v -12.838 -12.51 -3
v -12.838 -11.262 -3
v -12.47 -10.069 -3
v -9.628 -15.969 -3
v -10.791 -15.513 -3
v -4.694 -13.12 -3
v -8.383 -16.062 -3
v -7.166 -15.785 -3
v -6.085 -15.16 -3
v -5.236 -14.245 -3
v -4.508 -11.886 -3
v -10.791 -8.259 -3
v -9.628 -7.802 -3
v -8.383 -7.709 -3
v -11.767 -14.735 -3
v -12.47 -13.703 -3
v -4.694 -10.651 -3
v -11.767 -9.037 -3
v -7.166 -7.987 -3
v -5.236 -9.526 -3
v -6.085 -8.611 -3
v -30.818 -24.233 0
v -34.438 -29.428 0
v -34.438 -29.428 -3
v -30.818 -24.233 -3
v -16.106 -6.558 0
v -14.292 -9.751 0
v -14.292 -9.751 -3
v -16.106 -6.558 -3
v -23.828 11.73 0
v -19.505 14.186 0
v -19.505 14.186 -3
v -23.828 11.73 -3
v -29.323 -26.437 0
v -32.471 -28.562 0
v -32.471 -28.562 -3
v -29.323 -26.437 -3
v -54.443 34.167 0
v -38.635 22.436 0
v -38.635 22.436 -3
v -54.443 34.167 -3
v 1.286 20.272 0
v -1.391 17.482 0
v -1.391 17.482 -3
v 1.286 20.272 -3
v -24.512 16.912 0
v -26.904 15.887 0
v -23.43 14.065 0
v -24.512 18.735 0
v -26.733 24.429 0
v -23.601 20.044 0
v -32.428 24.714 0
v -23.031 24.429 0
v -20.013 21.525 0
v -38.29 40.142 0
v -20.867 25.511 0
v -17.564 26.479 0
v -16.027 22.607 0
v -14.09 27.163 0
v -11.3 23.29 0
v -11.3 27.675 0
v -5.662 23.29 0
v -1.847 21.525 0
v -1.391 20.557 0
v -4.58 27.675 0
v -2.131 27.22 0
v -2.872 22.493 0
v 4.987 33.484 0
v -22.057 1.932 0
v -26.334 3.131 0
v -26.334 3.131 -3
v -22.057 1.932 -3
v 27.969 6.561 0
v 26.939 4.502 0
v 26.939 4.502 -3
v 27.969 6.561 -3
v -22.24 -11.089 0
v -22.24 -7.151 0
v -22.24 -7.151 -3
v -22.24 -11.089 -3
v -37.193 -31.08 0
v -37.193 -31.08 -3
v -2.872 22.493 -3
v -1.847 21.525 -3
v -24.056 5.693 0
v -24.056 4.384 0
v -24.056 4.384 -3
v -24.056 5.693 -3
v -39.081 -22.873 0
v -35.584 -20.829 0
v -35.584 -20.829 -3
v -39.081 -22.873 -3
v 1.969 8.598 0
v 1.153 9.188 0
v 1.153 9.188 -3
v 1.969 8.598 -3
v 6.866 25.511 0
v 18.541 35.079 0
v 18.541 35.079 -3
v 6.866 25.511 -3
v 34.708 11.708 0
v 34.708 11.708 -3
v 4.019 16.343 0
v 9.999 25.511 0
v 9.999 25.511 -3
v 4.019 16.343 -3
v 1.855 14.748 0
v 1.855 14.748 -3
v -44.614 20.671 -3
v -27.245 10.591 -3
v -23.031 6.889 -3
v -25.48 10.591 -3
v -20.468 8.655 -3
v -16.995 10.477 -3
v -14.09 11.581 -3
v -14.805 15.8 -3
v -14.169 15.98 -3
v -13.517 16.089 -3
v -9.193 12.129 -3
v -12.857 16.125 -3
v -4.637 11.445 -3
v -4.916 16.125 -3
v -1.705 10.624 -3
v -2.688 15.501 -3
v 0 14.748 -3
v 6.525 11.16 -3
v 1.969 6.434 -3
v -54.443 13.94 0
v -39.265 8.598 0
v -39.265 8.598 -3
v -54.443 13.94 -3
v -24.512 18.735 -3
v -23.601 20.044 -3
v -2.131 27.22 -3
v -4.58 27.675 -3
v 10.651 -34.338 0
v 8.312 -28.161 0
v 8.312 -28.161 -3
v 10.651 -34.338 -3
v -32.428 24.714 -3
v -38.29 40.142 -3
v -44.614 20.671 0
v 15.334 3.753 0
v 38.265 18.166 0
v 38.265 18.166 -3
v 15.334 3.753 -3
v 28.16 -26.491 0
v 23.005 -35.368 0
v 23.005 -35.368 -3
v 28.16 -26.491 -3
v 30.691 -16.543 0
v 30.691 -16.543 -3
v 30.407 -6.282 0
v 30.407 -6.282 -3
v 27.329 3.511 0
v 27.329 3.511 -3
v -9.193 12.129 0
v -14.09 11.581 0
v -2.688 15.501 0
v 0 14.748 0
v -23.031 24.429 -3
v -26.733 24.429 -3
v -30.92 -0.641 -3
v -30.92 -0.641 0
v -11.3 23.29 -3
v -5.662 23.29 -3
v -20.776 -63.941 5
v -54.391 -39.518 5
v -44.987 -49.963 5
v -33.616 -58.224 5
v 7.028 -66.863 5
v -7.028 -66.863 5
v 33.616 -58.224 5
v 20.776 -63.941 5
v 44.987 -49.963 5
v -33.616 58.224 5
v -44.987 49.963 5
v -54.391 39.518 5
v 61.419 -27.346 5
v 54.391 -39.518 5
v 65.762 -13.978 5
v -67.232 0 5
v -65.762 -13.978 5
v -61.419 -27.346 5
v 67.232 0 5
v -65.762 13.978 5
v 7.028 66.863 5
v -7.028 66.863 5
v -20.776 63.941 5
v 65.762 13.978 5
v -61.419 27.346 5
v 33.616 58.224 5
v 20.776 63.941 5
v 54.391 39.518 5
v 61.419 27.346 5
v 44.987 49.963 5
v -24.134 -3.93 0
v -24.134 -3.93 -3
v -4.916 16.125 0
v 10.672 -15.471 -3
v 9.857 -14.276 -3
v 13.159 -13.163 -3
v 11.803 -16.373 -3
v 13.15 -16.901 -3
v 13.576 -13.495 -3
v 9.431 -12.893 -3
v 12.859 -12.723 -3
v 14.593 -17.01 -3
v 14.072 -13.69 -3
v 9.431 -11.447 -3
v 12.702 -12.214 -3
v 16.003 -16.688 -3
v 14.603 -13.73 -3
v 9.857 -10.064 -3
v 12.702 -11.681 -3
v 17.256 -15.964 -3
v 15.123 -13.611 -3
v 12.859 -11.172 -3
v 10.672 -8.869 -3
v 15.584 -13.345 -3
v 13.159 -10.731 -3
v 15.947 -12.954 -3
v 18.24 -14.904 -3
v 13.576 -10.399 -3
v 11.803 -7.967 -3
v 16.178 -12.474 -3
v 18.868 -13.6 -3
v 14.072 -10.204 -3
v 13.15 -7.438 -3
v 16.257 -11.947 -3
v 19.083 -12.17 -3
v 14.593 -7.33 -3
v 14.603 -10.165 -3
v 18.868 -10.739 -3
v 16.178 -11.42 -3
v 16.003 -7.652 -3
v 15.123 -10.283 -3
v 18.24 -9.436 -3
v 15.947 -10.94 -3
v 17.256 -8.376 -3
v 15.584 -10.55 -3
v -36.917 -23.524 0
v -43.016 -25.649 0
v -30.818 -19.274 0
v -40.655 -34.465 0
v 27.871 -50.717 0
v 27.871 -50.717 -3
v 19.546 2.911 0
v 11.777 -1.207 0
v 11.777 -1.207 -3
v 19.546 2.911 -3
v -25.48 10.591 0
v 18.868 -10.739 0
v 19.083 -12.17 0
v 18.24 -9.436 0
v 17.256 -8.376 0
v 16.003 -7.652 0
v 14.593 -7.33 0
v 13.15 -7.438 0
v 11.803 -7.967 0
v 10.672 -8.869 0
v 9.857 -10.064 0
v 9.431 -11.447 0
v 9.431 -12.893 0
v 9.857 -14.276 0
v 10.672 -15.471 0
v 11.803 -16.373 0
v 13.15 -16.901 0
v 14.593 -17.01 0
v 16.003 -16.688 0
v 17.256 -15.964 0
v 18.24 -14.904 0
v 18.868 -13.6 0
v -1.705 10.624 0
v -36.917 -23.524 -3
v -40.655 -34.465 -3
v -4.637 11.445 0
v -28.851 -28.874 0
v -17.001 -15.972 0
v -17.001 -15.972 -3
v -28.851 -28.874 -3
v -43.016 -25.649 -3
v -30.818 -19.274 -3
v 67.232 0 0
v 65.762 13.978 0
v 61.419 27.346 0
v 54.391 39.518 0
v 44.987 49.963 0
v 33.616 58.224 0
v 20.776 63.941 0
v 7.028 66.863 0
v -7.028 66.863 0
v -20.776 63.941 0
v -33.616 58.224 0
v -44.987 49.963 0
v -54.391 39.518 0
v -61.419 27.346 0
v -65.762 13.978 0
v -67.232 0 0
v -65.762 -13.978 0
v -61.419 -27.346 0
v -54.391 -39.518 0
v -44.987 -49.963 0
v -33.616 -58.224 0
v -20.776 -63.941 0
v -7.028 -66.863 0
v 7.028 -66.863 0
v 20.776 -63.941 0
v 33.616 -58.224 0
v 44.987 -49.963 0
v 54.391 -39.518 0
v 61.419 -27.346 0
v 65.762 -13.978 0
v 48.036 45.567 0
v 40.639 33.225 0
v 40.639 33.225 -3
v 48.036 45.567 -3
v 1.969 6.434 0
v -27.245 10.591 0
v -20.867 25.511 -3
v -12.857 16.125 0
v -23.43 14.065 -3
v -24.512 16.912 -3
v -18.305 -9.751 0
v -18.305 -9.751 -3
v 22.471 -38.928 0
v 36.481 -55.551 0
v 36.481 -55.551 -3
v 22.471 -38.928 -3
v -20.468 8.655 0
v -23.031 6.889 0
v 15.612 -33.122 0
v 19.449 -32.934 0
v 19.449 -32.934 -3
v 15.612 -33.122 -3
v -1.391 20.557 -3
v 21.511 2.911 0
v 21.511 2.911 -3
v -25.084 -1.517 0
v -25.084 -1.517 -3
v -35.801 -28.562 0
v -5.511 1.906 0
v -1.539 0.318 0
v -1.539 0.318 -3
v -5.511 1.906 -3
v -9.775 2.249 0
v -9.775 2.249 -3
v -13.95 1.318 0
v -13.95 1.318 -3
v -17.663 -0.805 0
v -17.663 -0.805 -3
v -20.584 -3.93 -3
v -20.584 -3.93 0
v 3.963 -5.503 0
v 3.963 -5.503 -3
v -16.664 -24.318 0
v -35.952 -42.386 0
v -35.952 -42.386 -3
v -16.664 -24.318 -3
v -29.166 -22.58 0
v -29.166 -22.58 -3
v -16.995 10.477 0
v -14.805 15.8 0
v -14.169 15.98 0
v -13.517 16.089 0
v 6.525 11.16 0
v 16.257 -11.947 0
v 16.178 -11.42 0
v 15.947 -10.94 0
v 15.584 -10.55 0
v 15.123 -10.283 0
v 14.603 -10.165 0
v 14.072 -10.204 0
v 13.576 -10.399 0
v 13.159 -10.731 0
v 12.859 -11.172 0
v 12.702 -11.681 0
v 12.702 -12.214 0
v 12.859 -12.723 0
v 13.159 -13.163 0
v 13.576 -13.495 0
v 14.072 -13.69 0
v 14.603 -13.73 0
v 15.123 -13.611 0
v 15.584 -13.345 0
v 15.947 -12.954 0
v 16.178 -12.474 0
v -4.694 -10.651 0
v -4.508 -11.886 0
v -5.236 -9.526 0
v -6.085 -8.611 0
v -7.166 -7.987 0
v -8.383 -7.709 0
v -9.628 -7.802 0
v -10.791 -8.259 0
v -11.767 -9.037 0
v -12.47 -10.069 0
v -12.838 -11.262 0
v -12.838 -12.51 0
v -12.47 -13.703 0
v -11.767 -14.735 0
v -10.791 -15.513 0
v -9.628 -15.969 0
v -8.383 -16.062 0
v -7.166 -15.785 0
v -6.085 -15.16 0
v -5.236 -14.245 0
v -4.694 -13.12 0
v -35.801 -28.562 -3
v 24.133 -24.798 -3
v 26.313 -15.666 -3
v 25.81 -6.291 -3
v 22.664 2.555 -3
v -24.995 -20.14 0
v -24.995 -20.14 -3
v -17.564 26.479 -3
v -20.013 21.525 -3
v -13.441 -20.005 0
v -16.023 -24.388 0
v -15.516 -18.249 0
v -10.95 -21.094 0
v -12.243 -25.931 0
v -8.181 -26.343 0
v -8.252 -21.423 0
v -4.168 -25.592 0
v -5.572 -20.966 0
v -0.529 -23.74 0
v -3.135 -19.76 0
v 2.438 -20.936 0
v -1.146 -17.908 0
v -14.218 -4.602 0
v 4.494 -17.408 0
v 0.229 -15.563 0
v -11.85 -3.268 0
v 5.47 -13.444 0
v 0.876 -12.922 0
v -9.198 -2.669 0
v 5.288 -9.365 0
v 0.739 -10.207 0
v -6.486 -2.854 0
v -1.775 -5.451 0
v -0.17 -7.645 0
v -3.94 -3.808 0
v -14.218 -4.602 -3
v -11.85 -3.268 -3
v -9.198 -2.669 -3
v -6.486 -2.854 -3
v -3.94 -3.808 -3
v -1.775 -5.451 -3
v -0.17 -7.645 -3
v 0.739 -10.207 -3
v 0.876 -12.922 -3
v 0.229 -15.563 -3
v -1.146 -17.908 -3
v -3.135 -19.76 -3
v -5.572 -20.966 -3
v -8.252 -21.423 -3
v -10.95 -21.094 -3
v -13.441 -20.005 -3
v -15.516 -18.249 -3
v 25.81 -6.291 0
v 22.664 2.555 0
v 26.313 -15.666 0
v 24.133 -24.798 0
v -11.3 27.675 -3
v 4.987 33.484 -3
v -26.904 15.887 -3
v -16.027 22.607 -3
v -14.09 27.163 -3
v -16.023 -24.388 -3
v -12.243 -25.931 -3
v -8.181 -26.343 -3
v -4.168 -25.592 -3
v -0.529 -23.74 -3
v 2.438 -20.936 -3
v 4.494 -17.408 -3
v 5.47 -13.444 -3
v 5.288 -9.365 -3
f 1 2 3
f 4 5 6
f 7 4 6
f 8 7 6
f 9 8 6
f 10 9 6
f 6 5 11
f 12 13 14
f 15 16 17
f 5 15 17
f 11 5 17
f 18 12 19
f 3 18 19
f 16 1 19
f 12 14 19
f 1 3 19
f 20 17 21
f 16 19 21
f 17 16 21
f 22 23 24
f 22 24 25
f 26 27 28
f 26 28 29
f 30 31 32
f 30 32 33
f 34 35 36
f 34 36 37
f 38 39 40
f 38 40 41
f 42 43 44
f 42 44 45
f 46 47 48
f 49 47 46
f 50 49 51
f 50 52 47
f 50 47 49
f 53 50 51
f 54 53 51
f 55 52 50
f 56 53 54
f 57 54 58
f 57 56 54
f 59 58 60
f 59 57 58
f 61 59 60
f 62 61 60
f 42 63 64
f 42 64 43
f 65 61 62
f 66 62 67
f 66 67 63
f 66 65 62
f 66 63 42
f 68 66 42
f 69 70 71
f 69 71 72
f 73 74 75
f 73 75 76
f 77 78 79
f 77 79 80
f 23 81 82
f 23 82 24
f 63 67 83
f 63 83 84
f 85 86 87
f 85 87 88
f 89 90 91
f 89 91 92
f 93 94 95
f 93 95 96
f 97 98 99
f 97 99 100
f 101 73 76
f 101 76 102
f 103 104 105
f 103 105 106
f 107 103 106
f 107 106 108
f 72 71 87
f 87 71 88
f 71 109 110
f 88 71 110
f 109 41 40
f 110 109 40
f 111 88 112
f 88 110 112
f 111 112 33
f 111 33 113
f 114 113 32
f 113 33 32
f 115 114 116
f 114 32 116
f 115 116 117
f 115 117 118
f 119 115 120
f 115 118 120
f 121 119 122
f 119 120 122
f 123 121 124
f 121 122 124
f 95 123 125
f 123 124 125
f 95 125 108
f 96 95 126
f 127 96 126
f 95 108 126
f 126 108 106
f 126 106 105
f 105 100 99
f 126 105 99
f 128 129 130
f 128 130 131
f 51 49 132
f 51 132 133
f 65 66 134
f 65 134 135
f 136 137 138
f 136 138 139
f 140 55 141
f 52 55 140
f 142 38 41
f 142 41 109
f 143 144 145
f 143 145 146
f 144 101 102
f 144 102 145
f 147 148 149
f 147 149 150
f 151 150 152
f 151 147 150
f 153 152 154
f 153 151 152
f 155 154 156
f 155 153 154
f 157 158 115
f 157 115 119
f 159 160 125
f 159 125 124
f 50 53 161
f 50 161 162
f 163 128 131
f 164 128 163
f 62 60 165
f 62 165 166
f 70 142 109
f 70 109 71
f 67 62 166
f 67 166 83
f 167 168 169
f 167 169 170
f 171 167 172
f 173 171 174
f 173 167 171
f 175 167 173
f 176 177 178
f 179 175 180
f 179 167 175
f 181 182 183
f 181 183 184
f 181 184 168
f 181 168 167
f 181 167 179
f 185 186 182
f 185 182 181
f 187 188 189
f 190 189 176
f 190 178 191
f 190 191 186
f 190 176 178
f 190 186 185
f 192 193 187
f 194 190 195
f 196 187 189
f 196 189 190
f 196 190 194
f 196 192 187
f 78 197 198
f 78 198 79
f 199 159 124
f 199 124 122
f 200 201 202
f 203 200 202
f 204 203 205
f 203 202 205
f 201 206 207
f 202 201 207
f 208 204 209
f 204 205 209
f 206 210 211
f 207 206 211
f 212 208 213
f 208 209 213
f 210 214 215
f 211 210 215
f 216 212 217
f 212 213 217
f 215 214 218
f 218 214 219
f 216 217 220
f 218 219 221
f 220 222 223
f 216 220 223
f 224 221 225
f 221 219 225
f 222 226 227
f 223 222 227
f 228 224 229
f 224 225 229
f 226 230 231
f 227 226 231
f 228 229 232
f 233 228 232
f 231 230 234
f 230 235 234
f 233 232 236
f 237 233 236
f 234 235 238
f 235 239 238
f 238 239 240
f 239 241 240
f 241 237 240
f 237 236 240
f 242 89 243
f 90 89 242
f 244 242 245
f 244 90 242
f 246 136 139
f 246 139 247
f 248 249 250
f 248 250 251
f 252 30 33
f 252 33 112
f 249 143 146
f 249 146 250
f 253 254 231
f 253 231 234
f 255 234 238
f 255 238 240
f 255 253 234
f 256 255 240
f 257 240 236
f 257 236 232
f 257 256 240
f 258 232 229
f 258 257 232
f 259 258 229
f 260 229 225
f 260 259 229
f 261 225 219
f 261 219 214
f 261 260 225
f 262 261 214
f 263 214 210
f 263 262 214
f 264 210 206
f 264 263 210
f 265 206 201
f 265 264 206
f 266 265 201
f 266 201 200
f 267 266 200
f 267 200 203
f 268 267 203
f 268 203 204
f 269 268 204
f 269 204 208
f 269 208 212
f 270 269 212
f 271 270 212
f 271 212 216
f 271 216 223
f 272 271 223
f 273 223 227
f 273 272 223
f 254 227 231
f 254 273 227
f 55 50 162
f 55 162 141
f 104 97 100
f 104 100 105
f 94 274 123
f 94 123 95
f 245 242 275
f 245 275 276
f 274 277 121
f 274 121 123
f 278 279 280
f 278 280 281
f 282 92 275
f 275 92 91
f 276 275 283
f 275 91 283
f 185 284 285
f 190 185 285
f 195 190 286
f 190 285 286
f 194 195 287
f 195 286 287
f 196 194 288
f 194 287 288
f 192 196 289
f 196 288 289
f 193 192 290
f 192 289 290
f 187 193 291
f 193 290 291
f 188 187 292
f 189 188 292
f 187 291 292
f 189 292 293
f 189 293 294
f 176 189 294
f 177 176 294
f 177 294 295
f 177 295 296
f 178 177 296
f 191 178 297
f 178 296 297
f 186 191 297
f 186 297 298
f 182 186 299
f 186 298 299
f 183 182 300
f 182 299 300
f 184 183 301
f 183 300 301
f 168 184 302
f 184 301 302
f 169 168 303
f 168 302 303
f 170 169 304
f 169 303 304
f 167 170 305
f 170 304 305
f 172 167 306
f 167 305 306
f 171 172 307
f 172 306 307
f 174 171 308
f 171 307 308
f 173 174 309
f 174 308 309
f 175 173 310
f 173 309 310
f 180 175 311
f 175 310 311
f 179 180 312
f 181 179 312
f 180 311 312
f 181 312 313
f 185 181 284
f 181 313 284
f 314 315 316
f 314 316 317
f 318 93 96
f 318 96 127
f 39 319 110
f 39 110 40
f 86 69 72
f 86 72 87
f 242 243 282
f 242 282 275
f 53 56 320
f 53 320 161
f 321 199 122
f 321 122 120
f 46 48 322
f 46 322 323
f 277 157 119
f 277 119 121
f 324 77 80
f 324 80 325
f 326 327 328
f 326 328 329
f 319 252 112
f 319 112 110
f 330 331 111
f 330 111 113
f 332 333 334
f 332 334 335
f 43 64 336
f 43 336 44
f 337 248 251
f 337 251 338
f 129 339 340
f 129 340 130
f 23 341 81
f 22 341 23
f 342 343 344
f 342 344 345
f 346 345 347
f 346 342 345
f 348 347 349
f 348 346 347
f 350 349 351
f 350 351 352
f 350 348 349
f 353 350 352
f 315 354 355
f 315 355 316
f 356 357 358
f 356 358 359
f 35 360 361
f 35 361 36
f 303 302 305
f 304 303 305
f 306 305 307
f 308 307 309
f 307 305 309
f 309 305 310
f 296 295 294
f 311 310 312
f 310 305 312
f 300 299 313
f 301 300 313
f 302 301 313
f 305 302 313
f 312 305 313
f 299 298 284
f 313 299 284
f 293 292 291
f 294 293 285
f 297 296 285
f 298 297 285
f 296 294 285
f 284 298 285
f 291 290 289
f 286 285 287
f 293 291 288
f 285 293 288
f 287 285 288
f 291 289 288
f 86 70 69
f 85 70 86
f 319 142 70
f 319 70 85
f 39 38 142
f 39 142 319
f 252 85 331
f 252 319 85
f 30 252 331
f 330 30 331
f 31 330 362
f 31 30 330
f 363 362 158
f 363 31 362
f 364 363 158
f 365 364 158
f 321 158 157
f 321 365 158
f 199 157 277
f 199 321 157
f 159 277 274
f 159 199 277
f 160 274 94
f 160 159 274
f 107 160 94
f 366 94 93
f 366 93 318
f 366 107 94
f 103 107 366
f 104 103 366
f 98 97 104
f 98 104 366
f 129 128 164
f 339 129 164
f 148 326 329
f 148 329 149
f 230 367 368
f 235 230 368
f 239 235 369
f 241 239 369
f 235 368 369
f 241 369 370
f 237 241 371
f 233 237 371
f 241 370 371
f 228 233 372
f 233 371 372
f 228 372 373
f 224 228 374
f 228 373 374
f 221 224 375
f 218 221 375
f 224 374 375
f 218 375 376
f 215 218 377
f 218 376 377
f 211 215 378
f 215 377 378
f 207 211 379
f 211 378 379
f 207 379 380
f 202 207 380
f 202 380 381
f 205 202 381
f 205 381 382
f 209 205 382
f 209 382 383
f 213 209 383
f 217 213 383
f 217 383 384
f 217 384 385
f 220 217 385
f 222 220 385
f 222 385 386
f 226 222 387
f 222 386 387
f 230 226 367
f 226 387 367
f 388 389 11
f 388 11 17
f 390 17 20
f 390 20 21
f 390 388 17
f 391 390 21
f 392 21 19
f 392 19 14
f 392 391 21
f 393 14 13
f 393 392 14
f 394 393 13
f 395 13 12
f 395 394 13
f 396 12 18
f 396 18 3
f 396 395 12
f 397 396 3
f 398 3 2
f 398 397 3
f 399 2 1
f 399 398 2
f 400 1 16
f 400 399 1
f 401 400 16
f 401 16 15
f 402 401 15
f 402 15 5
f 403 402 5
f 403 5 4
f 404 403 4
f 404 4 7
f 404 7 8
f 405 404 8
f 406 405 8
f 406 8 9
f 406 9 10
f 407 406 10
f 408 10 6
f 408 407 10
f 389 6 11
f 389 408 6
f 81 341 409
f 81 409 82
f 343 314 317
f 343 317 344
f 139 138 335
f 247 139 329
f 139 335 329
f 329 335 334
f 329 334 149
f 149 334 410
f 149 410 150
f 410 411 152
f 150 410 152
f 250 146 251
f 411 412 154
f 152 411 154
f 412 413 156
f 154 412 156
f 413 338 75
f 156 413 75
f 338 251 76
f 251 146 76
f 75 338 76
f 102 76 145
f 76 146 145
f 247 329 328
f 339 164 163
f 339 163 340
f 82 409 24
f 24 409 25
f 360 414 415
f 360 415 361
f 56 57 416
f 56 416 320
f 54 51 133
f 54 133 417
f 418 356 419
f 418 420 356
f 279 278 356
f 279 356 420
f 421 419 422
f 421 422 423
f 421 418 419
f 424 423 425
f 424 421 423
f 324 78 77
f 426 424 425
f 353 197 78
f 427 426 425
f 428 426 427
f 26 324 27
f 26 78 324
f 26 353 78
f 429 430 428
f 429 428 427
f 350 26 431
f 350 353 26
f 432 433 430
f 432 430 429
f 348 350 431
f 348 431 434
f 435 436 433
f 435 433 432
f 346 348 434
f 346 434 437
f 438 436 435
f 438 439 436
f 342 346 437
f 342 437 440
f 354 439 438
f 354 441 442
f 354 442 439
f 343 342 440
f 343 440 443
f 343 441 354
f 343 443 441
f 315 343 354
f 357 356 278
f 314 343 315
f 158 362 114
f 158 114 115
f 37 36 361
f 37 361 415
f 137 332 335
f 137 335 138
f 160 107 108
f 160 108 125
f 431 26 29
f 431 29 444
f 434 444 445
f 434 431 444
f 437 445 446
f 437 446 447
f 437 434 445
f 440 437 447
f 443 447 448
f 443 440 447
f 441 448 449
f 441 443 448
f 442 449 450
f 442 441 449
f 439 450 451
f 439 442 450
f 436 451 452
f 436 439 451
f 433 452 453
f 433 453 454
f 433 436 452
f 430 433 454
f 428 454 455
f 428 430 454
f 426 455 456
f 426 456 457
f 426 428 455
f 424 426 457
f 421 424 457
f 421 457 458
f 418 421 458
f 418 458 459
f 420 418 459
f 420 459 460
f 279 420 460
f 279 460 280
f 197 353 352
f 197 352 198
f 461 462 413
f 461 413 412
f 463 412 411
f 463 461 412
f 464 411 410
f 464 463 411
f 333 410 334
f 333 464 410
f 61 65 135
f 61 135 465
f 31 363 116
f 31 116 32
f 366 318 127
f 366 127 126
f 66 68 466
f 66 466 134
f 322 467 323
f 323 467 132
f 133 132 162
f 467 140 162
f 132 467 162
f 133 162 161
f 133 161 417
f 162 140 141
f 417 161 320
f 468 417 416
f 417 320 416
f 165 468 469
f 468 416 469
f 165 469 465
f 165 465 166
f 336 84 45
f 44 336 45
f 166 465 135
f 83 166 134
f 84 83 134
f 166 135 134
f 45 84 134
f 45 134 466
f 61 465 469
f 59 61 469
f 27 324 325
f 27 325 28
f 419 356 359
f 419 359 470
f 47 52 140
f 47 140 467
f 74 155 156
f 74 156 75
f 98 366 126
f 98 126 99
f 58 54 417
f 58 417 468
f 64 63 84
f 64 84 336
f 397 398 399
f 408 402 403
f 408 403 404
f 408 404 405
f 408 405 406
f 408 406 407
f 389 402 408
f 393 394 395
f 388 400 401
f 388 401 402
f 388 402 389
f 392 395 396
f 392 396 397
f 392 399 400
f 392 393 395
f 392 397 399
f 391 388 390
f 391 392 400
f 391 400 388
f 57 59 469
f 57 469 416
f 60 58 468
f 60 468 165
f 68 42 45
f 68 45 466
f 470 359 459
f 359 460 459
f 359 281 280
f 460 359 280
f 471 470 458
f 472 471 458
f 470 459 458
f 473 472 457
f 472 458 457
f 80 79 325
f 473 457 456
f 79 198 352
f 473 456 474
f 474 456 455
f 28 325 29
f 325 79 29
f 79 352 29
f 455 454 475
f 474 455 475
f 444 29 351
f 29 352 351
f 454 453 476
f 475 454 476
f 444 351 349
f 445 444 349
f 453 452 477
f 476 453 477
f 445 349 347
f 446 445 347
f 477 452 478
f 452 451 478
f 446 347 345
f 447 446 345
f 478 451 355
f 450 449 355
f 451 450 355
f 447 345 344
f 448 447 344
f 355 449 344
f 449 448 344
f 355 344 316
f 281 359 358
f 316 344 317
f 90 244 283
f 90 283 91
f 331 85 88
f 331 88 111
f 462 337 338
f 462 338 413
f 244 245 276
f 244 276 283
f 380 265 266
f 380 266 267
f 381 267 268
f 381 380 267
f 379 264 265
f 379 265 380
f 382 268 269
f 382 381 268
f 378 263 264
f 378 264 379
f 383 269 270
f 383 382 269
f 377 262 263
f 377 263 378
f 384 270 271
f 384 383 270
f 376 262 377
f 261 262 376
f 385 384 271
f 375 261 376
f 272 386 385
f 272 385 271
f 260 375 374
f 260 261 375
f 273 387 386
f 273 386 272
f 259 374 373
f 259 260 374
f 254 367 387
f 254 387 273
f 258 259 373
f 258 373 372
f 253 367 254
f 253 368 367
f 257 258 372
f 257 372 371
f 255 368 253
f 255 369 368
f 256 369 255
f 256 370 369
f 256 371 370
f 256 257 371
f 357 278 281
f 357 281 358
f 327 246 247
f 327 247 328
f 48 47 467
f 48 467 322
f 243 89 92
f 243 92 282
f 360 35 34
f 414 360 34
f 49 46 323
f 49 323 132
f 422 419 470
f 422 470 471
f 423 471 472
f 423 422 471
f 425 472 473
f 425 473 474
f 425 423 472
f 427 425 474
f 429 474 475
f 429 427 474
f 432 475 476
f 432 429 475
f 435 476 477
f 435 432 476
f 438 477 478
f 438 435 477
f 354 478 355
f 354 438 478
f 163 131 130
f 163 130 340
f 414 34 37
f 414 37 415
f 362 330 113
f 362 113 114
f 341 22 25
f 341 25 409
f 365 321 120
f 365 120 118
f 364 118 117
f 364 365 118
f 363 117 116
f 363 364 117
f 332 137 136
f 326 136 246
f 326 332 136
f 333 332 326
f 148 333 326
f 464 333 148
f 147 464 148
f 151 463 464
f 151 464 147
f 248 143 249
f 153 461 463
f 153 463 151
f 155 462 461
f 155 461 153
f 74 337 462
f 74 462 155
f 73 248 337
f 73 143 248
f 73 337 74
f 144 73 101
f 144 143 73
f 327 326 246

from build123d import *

# Parameters (mm, degrees)
F1_DEPTH = 3
F0_R     = 4.1883585847
F0_R_2   = 4.8531837551
F0_R_3   = 1.7874503883
F0_R_4   = 67.2315018971
F2_DEPTH = 5


with BuildPart() as f1:
    # F0 (on Top) → F1 (new body)
    with BuildSketch(Plane.XY):
        with BuildLine():
            Line((6.524791941, 11.1604705453), (18.5407903045, 35.0785702467))
            Line((18.5407903045, 35.0785702467), (6.8664811552, 25.5113355815))
            Line((6.8664811552, 25.5113355815), (9.9986130372, 25.5113355815))
            Line((9.9986130372, 25.5113355815), (4.0190881118, 16.3427311927))
            Line((4.0190881118, 16.3427311927), (1.8550701207, 14.748191461))
            Line((1.8550701207, 14.748191461), (0, 14.748191461))
            Line((0, 14.748191461), (-2.6880883992, 15.5013195603))
            Line((-2.6880883992, 15.5013195603), (-4.9156010843, 16.1254070699))
            Line((-4.9156010843, 16.1254070699), (-12.8565848023, 16.1254070699))
            ThreePointArc((-12.8565848023, 16.1254070699), (-13.8442379694, 16.0435606013), (-14.8049458285, 15.8002541438))
            Line((-14.8049458285, 15.8002541438), (-19.5052184044, 14.18649649))
            Line((-19.5052184044, 14.18649649), (-23.8284152001, 11.7299547419))
            Line((-23.8284152001, 11.7299547419), (-25.479901582, 10.5909984559))
            Line((-25.479901582, 10.5909984559), (-27.2452868521, 10.5909984559))
            Line((-27.2452868521, 10.5909984559), (-38.6348553002, 22.436151281))
            Line((-38.6348553002, 22.436151281), (-54.4432774186, 34.1674089432))
            Line((-54.4432774186, 34.1674089432), (-44.6143820882, 20.6707678735))
            Line((-44.6143820882, 20.6707678735), (-26.334118098, 3.1308280304))
            Line((-26.334118098, 3.1308280304), (-22.0568471308, 1.9324548836))
            Line((-22.0568471308, 1.9324548836), (-24.0562036633, 4.3836818077))
            Line((-24.0562036633, 4.3836818077), (-24.0562036633, 5.6934817694))
            Line((-24.0562036633, 5.6934817694), (-23.0311434716, 6.8893865682))
            Line((-23.0311434716, 6.8893865682), (-20.4684883356, 8.6547704414))
            Line((-20.4684883356, 8.6547704414), (-16.9946700335, 10.4771014303))
            Line((-16.9946700335, 10.4771014303), (-14.09033034, 11.5807517488))
            Line((-14.09033034, 11.5807517488), (-9.1928122565, 12.1285896748))
            Line((-9.1928122565, 12.1285896748), (-4.6369838528, 11.4452149719))
            Line((-4.6369838528, 11.4452149719), (-1.7052790924, 10.6238322991))
            Line((-1.7052790924, 10.6238322991), (1.1533434658, 9.1877146974))
            Line((1.1533434658, 9.1877146974), (1.9689633045, 8.5978163406))
            Line((1.9689633045, 8.5978163406), (1.9689633045, 6.4337980002))
            Line((1.9689633045, 6.4337980002), (6.524791941, 11.1604705453))
        make_face()
    extrude(amount=-F1_DEPTH)


with BuildPart() as f1b:
    # F0 (on Top) → F1, piece 2 (new body)
    with BuildSketch(Plane.XY):
        Polygon((-26.9036013633, 15.8871430904), (-23.4297811985, 14.0648102388), (-24.5117917657, 16.9122032821), (-24.5117917657, 18.7345407903), (-23.6006230116, 20.0443416834), (-20.0129076838, 21.5249862522), (-16.0265564919, 22.6069949567), (-11.2998858094, 23.2903696597), (-5.6620473042, 23.2903696597), (-2.8716025408, 22.4930997938), (-1.8465407193, 21.5249862522), (-1.390957972, 20.5568727106), (-1.390957972, 17.48168841), (1.2855911627, 20.2721264213), (4.9872016534, 33.484030515), (-2.1312802564, 27.2197667509), (-4.580038134, 27.6753548533), (-7.5982743874, 27.6753548533), (-11.2998858094, 27.6753548533), (-14.09033034, 27.1628238261), (-17.5641495734, 26.4794509858), (-20.8671260625, 25.5113355815), (-23.0311434716, 24.4293212891), (-23.4297811985, 24.4293212891), (-26.7327539623, 24.4293212891), (-38.2902911921, 40.1423304444), (-32.4275419116, 24.7140601277), align=None)
    extrude(amount=-F1_DEPTH)


with BuildPart() as f1c:
    # F0 (on Top) → F1, piece 3 (new body)
    with BuildSketch(Plane.XY):
        Polygon((-30.920324406, -0.6410955102), (-25.0839442015, -1.5165531076), (-39.2646156251, 8.5978163406), (-54.4432774186, 13.9403799549), align=None)
    extrude(amount=-F1_DEPTH)


with BuildPart() as f1d:
    # F0 (on Top) → F1, piece 4 (new body)
    with BuildSketch(Plane.XY):
        Polygon((-36.9173251092, -23.5243160278), (-40.6554341316, -34.4649702311), (-30.8183096349, -19.2739889026), (-35.5839021504, -20.8293963224), (-39.081171155, -22.8726491332), (-43.0163405836, -25.649478659), align=None)
    extrude(amount=-F1_DEPTH)


with BuildPart() as f1e:
    # F0 (on Top) → F1, piece 5 (new body)
    with BuildSketch(Plane.XY):
        Polygon((-34.4383716583, -29.4275470078), (-30.8183096349, -24.2327023298), (-35.8010726204, -28.561739251), (-37.1927656233, -31.0804508626), align=None)
    extrude(amount=-F1_DEPTH)


with BuildPart() as f1f:
    # F0 (on Top) → F1, piece 6 (new body)
    with BuildSketch(Plane.XY):
        Polygon((-29.165674001, -22.5797984749), (-32.4709452689, -28.561739251), (-29.3230675161, -26.4365747571), (-24.994732812, -20.1397966594), align=None)
    extrude(amount=-F1_DEPTH)


with BuildPart() as f1g:
    # F0 (on Top) → F1, piece 7 (new body)
    with BuildSketch(Plane.XY):
        with BuildLine():
            Line((-28.8508869708, -28.874181211), (-35.9521023929, -42.3855111003))
            Line((-35.9521023929, -42.3855111003), (-16.6643485427, -24.3179053068))
            Line((-16.6643485427, -24.3179053068), (-16.0232782364, -24.3884529918))
            ThreePointArc((-16.0232782364, -24.3884529918), (1.0549083614, -22.4439980096), (3.9627072361, -5.5032167894))
            Line((3.9627072361, -5.5032167894), (40.6385473907, 33.2254134119))
            Line((40.6385473907, 33.2254134119), (48.0357185006, 45.5672293901))
            Line((48.0357185006, 45.5672293901), (-1.5388774003, 0.3179199721))
            ThreePointArc((-1.5388774003, 0.3179199721), (-11.897114444, 1.940222604), (-20.5842528774, -3.9299193296))
            Line((-20.5842528774, -3.9299193296), (-24.1336280736, -3.9299193296))
            Line((-24.1336280736, -3.9299193296), (-22.240338847, -7.150552102))
            Line((-22.240338847, -7.150552102), (-22.240338847, -11.0886627808))
            Line((-22.240338847, -11.0886627808), (-18.3054897934, -9.7508141771))
            Line((-18.3054897934, -9.7508141771), (-14.2919449136, -9.7508141771))
            Line((-14.2919449136, -9.7508141771), (-16.1061811793, -6.5578027082))
            ThreePointArc((-16.1061811793, -6.5578027082), (0.8755312536, -12.9223696784), (-17.0014028047, -15.9722055013))
            Line((-17.0014028047, -15.9722055013), (-28.8508869708, -28.874181211))
        make_face()
    extrude(amount=-F1_DEPTH)


with BuildPart() as f1h:
    # F0 (on Top) → F1, piece 8 (new body)
    with BuildSketch(Plane.XY):
        with Locations((-8.6963499838, -11.8858055258)):
            Circle(F0_R)
    extrude(amount=-F1_DEPTH)


with BuildPart() as f1i:
    # F0 (on Top) → F1, piece 9 (new body)
    with BuildSketch(Plane.XY):
        with Locations((14.2299542493, -12.1699558468)):
            Circle(F0_R_2)
        with Locations((14.4696965303, -11.94712984)):
            Circle(F0_R_3, mode=Mode.SUBTRACT)
    extrude(amount=-F1_DEPTH)


with BuildPart() as f1j:
    # F0 (on Top) → F1, piece 10 (new body)
    with BuildSketch(Plane.XY):
        with BuildLine():
            Line((19.5455458015, 2.9109590687), (21.5109754354, 2.9109590687))
            Line((21.5109754354, 2.9109590687), (22.6636195944, 2.5548051165))
            ThreePointArc((22.6636195944, 2.5548051165), (26.3133055863, -15.6659247159), (19.4490682334, -32.9343192279))
            Line((19.4490682334, -32.9343192279), (15.6118310988, -33.1215001643))
            Line((15.6118310988, -33.1215001643), (8.3121499047, -28.1611848623))
            Line((8.3121499047, -28.1611848623), (10.6514208019, -34.3381799757))
            Line((10.6514208019, -34.3381799757), (27.8708003461, -50.7165715098))
            Line((27.8708003461, -50.7165715098), (36.4808142185, -55.5514258753))
            Line((36.4808142185, -55.5514258753), (22.4710945349, -38.9282732765))
            Line((22.4710945349, -38.9282732765), (23.0053216219, -35.3676788509))
            ThreePointArc((23.0053216219, -35.3676788509), (30.6912772846, -16.542626229), (27.3291476131, 3.5111166819))
            Line((27.3291476131, 3.5111166819), (26.9393716007, 4.5020021498))
            Line((26.9393716007, 4.5020021498), (27.9690362513, 6.5609994344))
            Line((27.9690362513, 6.5609994344), (34.707993269, 11.7084933445))
            Line((34.707993269, 11.7084933445), (38.2649675012, 18.1662589312))
            Line((38.2649675012, 18.1662589312), (15.3340501711, 3.7532753777))
            Line((15.3340501711, 3.7532753777), (11.7771970108, -1.2070364319))
            Line((11.7771970108, -1.2070364319), (19.5455458015, 2.9109590687))
        make_face()
    extrude(amount=-F1_DEPTH)


with BuildPart() as f2:
    # F0 (on Top) → F2 (new body)
    with BuildSketch(Plane.XY):
        Circle(F0_R_4)
        Polygon((-35.8010726204, -28.561739251), (-30.8183096349, -24.2327023298), (-34.4383716583, -29.4275470078), (-37.1927656233, -31.0804508626), align=None, mode=Mode.SUBTRACT)
        Polygon((-30.8183096349, -19.2739889026), (-40.6554341316, -34.4649702311), (-36.9173251092, -23.5243160278), (-43.0163405836, -25.649478659), (-39.081171155, -22.8726491332), (-35.5839021504, -20.8293963224), align=None, mode=Mode.SUBTRACT)
        Polygon((-29.3230675161, -26.4365747571), (-32.4709452689, -28.561739251), (-29.165674001, -22.5797984749), (-24.994732812, -20.1397966594), align=None, mode=Mode.SUBTRACT)
        with Locations((-8.6963499838, -11.8858055258)):
            Circle(F0_R, mode=Mode.SUBTRACT)
        with BuildLine():
            Line((22.6636195944, 2.5548051165), (21.5109754354, 2.9109590687))
            Line((21.5109754354, 2.9109590687), (19.5455458015, 2.9109590687))
            Line((19.5455458015, 2.9109590687), (11.7771970108, -1.2070364319))
            Line((11.7771970108, -1.2070364319), (15.3340501711, 3.7532753777))
            Line((15.3340501711, 3.7532753777), (38.2649675012, 18.1662589312))
            Line((38.2649675012, 18.1662589312), (34.707993269, 11.7084933445))
            Line((34.707993269, 11.7084933445), (27.9690362513, 6.5609994344))
            Line((27.9690362513, 6.5609994344), (26.9393716007, 4.5020021498))
            Line((26.9393716007, 4.5020021498), (27.3291476131, 3.5111166819))
            ThreePointArc((27.3291476131, 3.5111166819), (30.6912772846, -16.542626229), (23.0053216219, -35.3676788509))
            Line((23.0053216219, -35.3676788509), (22.4710945349, -38.9282732765))
            Line((22.4710945349, -38.9282732765), (36.4808142185, -55.5514258753))
            Line((36.4808142185, -55.5514258753), (27.8708003461, -50.7165715098))
            Line((27.8708003461, -50.7165715098), (10.6514208019, -34.3381799757))
            Line((10.6514208019, -34.3381799757), (8.3121499047, -28.1611848623))
            Line((8.3121499047, -28.1611848623), (15.6118310988, -33.1215001643))
            Line((15.6118310988, -33.1215001643), (19.4490682334, -32.9343192279))
            ThreePointArc((19.4490682334, -32.9343192279), (26.3133055863, -15.6659247159), (22.6636195944, 2.5548051165))
        make_face(mode=Mode.SUBTRACT)
        with Locations((14.2299542493, -12.1699558468)):
            Circle(F0_R_2, mode=Mode.SUBTRACT)
        Polygon((-39.2646156251, 8.5978163406), (-25.0839442015, -1.5165531076), (-30.920324406, -0.6410955102), (-54.4432774186, 13.9403799549), align=None, mode=Mode.SUBTRACT)
        with BuildLine():
            Line((6.8664811552, 25.5113355815), (18.5407903045, 35.0785702467))
            Line((18.5407903045, 35.0785702467), (6.524791941, 11.1604705453))
            Line((6.524791941, 11.1604705453), (1.9689633045, 6.4337980002))
            Line((1.9689633045, 6.4337980002), (1.9689633045, 8.5978163406))
            Line((1.9689633045, 8.5978163406), (1.1533434658, 9.1877146974))
            Line((1.1533434658, 9.1877146974), (-1.7052790924, 10.6238322991))
            Line((-1.7052790924, 10.6238322991), (-4.6369838528, 11.4452149719))
            Line((-4.6369838528, 11.4452149719), (-9.1928122565, 12.1285896748))
            Line((-9.1928122565, 12.1285896748), (-14.09033034, 11.5807517488))
            Line((-14.09033034, 11.5807517488), (-16.9946700335, 10.4771014303))
            Line((-16.9946700335, 10.4771014303), (-20.4684883356, 8.6547704414))
            Line((-20.4684883356, 8.6547704414), (-23.0311434716, 6.8893865682))
            Line((-23.0311434716, 6.8893865682), (-24.0562036633, 5.6934817694))
            Line((-24.0562036633, 5.6934817694), (-24.0562036633, 4.3836818077))
            Line((-24.0562036633, 4.3836818077), (-22.0568471308, 1.9324548836))
            Line((-22.0568471308, 1.9324548836), (-26.334118098, 3.1308280304))
            Line((-26.334118098, 3.1308280304), (-44.6143820882, 20.6707678735))
            Line((-44.6143820882, 20.6707678735), (-54.4432774186, 34.1674089432))
            Line((-54.4432774186, 34.1674089432), (-38.6348553002, 22.436151281))
            Line((-38.6348553002, 22.436151281), (-27.2452868521, 10.5909984559))
            Line((-27.2452868521, 10.5909984559), (-25.479901582, 10.5909984559))
            Line((-25.479901582, 10.5909984559), (-23.8284152001, 11.7299547419))
            Line((-23.8284152001, 11.7299547419), (-19.5052184044, 14.18649649))
            Line((-19.5052184044, 14.18649649), (-14.8049458285, 15.8002541438))
            ThreePointArc((-14.8049458285, 15.8002541438), (-13.8442379694, 16.0435606013), (-12.8565848023, 16.1254070699))
            Line((-12.8565848023, 16.1254070699), (-4.9156010843, 16.1254070699))
            Line((-4.9156010843, 16.1254070699), (-2.6880883992, 15.5013195603))
            Line((-2.6880883992, 15.5013195603), (0, 14.748191461))
            Line((0, 14.748191461), (1.8550701207, 14.748191461))
            Line((1.8550701207, 14.748191461), (4.0190881118, 16.3427311927))
            Line((4.0190881118, 16.3427311927), (9.9986130372, 25.5113355815))
            Line((9.9986130372, 25.5113355815), (6.8664811552, 25.5113355815))
        make_face(mode=Mode.SUBTRACT)
        Polygon((-24.5117917657, 16.9122032821), (-23.4297811985, 14.0648102388), (-26.9036013633, 15.8871430904), (-32.4275419116, 24.7140601277), (-38.2902911921, 40.1423304444), (-26.7327539623, 24.4293212891), (-23.4297811985, 24.4293212891), (-23.0311434716, 24.4293212891), (-20.8671260625, 25.5113355815), (-17.5641495734, 26.4794509858), (-14.09033034, 27.1628238261), (-11.2998858094, 27.6753548533), (-7.5982743874, 27.6753548533), (-4.580038134, 27.6753548533), (-2.1312802564, 27.2197667509), (4.9872016534, 33.484030515), (1.2855911627, 20.2721264213), (-1.390957972, 17.48168841), (-1.390957972, 20.5568727106), (-1.8465407193, 21.5249862522), (-2.8716025408, 22.4930997938), (-5.6620473042, 23.2903696597), (-11.2998858094, 23.2903696597), (-16.0265564919, 22.6069949567), (-20.0129076838, 21.5249862522), (-23.6006230116, 20.0443416834), (-24.5117917657, 18.7345407903), align=None, mode=Mode.SUBTRACT)
        with BuildLine():
            Line((-16.6643485427, -24.3179053068), (-35.9521023929, -42.3855111003))
            Line((-35.9521023929, -42.3855111003), (-28.8508869708, -28.874181211))
            Line((-28.8508869708, -28.874181211), (-17.0014028047, -15.9722055013))
            ThreePointArc((-17.0014028047, -15.9722055013), (0.8755312536, -12.9223696784), (-16.1061811793, -6.5578027082))
            Line((-16.1061811793, -6.5578027082), (-14.2919449136, -9.7508141771))
            Line((-14.2919449136, -9.7508141771), (-18.3054897934, -9.7508141771))
            Line((-18.3054897934, -9.7508141771), (-22.240338847, -11.0886627808))
            Line((-22.240338847, -11.0886627808), (-22.240338847, -7.150552102))
            Line((-22.240338847, -7.150552102), (-24.1336280736, -3.9299193296))
            Line((-24.1336280736, -3.9299193296), (-20.5842528774, -3.9299193296))
            ThreePointArc((-20.5842528774, -3.9299193296), (-11.897114444, 1.940222604), (-1.5388774003, 0.3179199721))
            Line((-1.5388774003, 0.3179199721), (48.0357185006, 45.5672293901))
            Line((48.0357185006, 45.5672293901), (40.6385473907, 33.2254134119))
            Line((40.6385473907, 33.2254134119), (3.9627072361, -5.5032167894))
            ThreePointArc((3.9627072361, -5.5032167894), (1.0549083614, -22.4439980096), (-16.0232782364, -24.3884529918))
            Line((-16.0232782364, -24.3884529918), (-16.6643485427, -24.3179053068))
        make_face(mode=Mode.SUBTRACT)
        with BuildLine():
            Line((-28.8508869708, -28.874181211), (-35.9521023929, -42.3855111003))
            Line((-35.9521023929, -42.3855111003), (-16.6643485427, -24.3179053068))
            Line((-16.6643485427, -24.3179053068), (-16.0232782364, -24.3884529918))
            ThreePointArc((-16.0232782364, -24.3884529918), (1.0549083614, -22.4439980096), (3.9627072361, -5.5032167894))
            Line((3.9627072361, -5.5032167894), (40.6385473907, 33.2254134119))
            Line((40.6385473907, 33.2254134119), (48.0357185006, 45.5672293901))
            Line((48.0357185006, 45.5672293901), (-1.5388774003, 0.3179199721))
            ThreePointArc((-1.5388774003, 0.3179199721), (-11.897114444, 1.940222604), (-20.5842528774, -3.9299193296))
            Line((-20.5842528774, -3.9299193296), (-24.1336280736, -3.9299193296))
            Line((-24.1336280736, -3.9299193296), (-22.240338847, -7.150552102))
            Line((-22.240338847, -7.150552102), (-22.240338847, -11.0886627808))
            Line((-22.240338847, -11.0886627808), (-18.3054897934, -9.7508141771))
            Line((-18.3054897934, -9.7508141771), (-14.2919449136, -9.7508141771))
            Line((-14.2919449136, -9.7508141771), (-16.1061811793, -6.5578027082))
            ThreePointArc((-16.1061811793, -6.5578027082), (0.8755312536, -12.9223696784), (-17.0014028047, -15.9722055013))
            Line((-17.0014028047, -15.9722055013), (-28.8508869708, -28.874181211))
        make_face()
        with BuildLine():
            Line((19.5455458015, 2.9109590687), (21.5109754354, 2.9109590687))
            Line((21.5109754354, 2.9109590687), (22.6636195944, 2.5548051165))
            ThreePointArc((22.6636195944, 2.5548051165), (26.3133055863, -15.6659247159), (19.4490682334, -32.9343192279))
            Line((19.4490682334, -32.9343192279), (15.6118310988, -33.1215001643))
            Line((15.6118310988, -33.1215001643), (8.3121499047, -28.1611848623))
            Line((8.3121499047, -28.1611848623), (10.6514208019, -34.3381799757))
            Line((10.6514208019, -34.3381799757), (27.8708003461, -50.7165715098))
            Line((27.8708003461, -50.7165715098), (36.4808142185, -55.5514258753))
            Line((36.4808142185, -55.5514258753), (22.4710945349, -38.9282732765))
            Line((22.4710945349, -38.9282732765), (23.0053216219, -35.3676788509))
            ThreePointArc((23.0053216219, -35.3676788509), (30.6912772846, -16.542626229), (27.3291476131, 3.5111166819))
            Line((27.3291476131, 3.5111166819), (26.9393716007, 4.5020021498))
            Line((26.9393716007, 4.5020021498), (27.9690362513, 6.5609994344))
            Line((27.9690362513, 6.5609994344), (34.707993269, 11.7084933445))
            Line((34.707993269, 11.7084933445), (38.2649675012, 18.1662589312))
            Line((38.2649675012, 18.1662589312), (15.3340501711, 3.7532753777))
            Line((15.3340501711, 3.7532753777), (11.7771970108, -1.2070364319))
            Line((11.7771970108, -1.2070364319), (19.5455458015, 2.9109590687))
        make_face()
        with BuildLine():
            Line((6.524791941, 11.1604705453), (18.5407903045, 35.0785702467))
            Line((18.5407903045, 35.0785702467), (6.8664811552, 25.5113355815))
            Line((6.8664811552, 25.5113355815), (9.9986130372, 25.5113355815))
            Line((9.9986130372, 25.5113355815), (4.0190881118, 16.3427311927))
            Line((4.0190881118, 16.3427311927), (1.8550701207, 14.748191461))
            Line((1.8550701207, 14.748191461), (0, 14.748191461))
            Line((0, 14.748191461), (-2.6880883992, 15.5013195603))
            Line((-2.6880883992, 15.5013195603), (-4.9156010843, 16.1254070699))
            Line((-4.9156010843, 16.1254070699), (-12.8565848023, 16.1254070699))
            ThreePointArc((-12.8565848023, 16.1254070699), (-13.8442379694, 16.0435606013), (-14.8049458285, 15.8002541438))
            Line((-14.8049458285, 15.8002541438), (-19.5052184044, 14.18649649))
            Line((-19.5052184044, 14.18649649), (-23.8284152001, 11.7299547419))
            Line((-23.8284152001, 11.7299547419), (-25.479901582, 10.5909984559))
            Line((-25.479901582, 10.5909984559), (-27.2452868521, 10.5909984559))
            Line((-27.2452868521, 10.5909984559), (-38.6348553002, 22.436151281))
            Line((-38.6348553002, 22.436151281), (-54.4432774186, 34.1674089432))
            Line((-54.4432774186, 34.1674089432), (-44.6143820882, 20.6707678735))
            Line((-44.6143820882, 20.6707678735), (-26.334118098, 3.1308280304))
            Line((-26.334118098, 3.1308280304), (-22.0568471308, 1.9324548836))
            Line((-22.0568471308, 1.9324548836), (-24.0562036633, 4.3836818077))
            Line((-24.0562036633, 4.3836818077), (-24.0562036633, 5.6934817694))
            Line((-24.0562036633, 5.6934817694), (-23.0311434716, 6.8893865682))
            Line((-23.0311434716, 6.8893865682), (-20.4684883356, 8.6547704414))
            Line((-20.4684883356, 8.6547704414), (-16.9946700335, 10.4771014303))
            Line((-16.9946700335, 10.4771014303), (-14.09033034, 11.5807517488))
            Line((-14.09033034, 11.5807517488), (-9.1928122565, 12.1285896748))
            Line((-9.1928122565, 12.1285896748), (-4.6369838528, 11.4452149719))
            Line((-4.6369838528, 11.4452149719), (-1.7052790924, 10.6238322991))
            Line((-1.7052790924, 10.6238322991), (1.1533434658, 9.1877146974))
            Line((1.1533434658, 9.1877146974), (1.9689633045, 8.5978163406))
            Line((1.9689633045, 8.5978163406), (1.9689633045, 6.4337980002))
            Line((1.9689633045, 6.4337980002), (6.524791941, 11.1604705453))
        make_face()
        Polygon((-26.9036013633, 15.8871430904), (-23.4297811985, 14.0648102388), (-24.5117917657, 16.9122032821), (-24.5117917657, 18.7345407903), (-23.6006230116, 20.0443416834), (-20.0129076838, 21.5249862522), (-16.0265564919, 22.6069949567), (-11.2998858094, 23.2903696597), (-5.6620473042, 23.2903696597), (-2.8716025408, 22.4930997938), (-1.8465407193, 21.5249862522), (-1.390957972, 20.5568727106), (-1.390957972, 17.48168841), (1.2855911627, 20.2721264213), (4.9872016534, 33.484030515), (-2.1312802564, 27.2197667509), (-4.580038134, 27.6753548533), (-7.5982743874, 27.6753548533), (-11.2998858094, 27.6753548533), (-14.09033034, 27.1628238261), (-17.5641495734, 26.4794509858), (-20.8671260625, 25.5113355815), (-23.0311434716, 24.4293212891), (-23.4297811985, 24.4293212891), (-26.7327539623, 24.4293212891), (-38.2902911921, 40.1423304444), (-32.4275419116, 24.7140601277), align=None)
        with Locations((14.2299542493, -12.1699558468)):
            Circle(F0_R_2)
        with Locations((14.4696965303, -11.94712984)):
            Circle(F0_R_3, mode=Mode.SUBTRACT)
        Polygon((-30.920324406, -0.6410955102), (-25.0839442015, -1.5165531076), (-39.2646156251, 8.5978163406), (-54.4432774186, 13.9403799549), align=None)
        with Locations((-8.6963499838, -11.8858055258)):
            Circle(F0_R)
        Polygon((-36.9173251092, -23.5243160278), (-40.6554341316, -34.4649702311), (-30.8183096349, -19.2739889026), (-35.5839021504, -20.8293963224), (-39.081171155, -22.8726491332), (-43.0163405836, -25.649478659), align=None)
        Polygon((-29.165674001, -22.5797984749), (-32.4709452689, -28.561739251), (-29.3230675161, -26.4365747571), (-24.994732812, -20.1397966594), align=None)
        with Locations((14.4696965303, -11.94712984)):
            Circle(F0_R_3)
        Polygon((-34.4383716583, -29.4275470078), (-30.8183096349, -24.2327023298), (-35.8010726204, -28.561739251), (-37.1927656233, -31.0804508626), align=None)
    extrude(amount=F2_DEPTH)


solid = Compound([f1.part, f1b.part, f1c.part, f1d.part, f1e.part, f1f.part, f1g.part, f1h.part, f1i.part, f1j.part, f2.part])
